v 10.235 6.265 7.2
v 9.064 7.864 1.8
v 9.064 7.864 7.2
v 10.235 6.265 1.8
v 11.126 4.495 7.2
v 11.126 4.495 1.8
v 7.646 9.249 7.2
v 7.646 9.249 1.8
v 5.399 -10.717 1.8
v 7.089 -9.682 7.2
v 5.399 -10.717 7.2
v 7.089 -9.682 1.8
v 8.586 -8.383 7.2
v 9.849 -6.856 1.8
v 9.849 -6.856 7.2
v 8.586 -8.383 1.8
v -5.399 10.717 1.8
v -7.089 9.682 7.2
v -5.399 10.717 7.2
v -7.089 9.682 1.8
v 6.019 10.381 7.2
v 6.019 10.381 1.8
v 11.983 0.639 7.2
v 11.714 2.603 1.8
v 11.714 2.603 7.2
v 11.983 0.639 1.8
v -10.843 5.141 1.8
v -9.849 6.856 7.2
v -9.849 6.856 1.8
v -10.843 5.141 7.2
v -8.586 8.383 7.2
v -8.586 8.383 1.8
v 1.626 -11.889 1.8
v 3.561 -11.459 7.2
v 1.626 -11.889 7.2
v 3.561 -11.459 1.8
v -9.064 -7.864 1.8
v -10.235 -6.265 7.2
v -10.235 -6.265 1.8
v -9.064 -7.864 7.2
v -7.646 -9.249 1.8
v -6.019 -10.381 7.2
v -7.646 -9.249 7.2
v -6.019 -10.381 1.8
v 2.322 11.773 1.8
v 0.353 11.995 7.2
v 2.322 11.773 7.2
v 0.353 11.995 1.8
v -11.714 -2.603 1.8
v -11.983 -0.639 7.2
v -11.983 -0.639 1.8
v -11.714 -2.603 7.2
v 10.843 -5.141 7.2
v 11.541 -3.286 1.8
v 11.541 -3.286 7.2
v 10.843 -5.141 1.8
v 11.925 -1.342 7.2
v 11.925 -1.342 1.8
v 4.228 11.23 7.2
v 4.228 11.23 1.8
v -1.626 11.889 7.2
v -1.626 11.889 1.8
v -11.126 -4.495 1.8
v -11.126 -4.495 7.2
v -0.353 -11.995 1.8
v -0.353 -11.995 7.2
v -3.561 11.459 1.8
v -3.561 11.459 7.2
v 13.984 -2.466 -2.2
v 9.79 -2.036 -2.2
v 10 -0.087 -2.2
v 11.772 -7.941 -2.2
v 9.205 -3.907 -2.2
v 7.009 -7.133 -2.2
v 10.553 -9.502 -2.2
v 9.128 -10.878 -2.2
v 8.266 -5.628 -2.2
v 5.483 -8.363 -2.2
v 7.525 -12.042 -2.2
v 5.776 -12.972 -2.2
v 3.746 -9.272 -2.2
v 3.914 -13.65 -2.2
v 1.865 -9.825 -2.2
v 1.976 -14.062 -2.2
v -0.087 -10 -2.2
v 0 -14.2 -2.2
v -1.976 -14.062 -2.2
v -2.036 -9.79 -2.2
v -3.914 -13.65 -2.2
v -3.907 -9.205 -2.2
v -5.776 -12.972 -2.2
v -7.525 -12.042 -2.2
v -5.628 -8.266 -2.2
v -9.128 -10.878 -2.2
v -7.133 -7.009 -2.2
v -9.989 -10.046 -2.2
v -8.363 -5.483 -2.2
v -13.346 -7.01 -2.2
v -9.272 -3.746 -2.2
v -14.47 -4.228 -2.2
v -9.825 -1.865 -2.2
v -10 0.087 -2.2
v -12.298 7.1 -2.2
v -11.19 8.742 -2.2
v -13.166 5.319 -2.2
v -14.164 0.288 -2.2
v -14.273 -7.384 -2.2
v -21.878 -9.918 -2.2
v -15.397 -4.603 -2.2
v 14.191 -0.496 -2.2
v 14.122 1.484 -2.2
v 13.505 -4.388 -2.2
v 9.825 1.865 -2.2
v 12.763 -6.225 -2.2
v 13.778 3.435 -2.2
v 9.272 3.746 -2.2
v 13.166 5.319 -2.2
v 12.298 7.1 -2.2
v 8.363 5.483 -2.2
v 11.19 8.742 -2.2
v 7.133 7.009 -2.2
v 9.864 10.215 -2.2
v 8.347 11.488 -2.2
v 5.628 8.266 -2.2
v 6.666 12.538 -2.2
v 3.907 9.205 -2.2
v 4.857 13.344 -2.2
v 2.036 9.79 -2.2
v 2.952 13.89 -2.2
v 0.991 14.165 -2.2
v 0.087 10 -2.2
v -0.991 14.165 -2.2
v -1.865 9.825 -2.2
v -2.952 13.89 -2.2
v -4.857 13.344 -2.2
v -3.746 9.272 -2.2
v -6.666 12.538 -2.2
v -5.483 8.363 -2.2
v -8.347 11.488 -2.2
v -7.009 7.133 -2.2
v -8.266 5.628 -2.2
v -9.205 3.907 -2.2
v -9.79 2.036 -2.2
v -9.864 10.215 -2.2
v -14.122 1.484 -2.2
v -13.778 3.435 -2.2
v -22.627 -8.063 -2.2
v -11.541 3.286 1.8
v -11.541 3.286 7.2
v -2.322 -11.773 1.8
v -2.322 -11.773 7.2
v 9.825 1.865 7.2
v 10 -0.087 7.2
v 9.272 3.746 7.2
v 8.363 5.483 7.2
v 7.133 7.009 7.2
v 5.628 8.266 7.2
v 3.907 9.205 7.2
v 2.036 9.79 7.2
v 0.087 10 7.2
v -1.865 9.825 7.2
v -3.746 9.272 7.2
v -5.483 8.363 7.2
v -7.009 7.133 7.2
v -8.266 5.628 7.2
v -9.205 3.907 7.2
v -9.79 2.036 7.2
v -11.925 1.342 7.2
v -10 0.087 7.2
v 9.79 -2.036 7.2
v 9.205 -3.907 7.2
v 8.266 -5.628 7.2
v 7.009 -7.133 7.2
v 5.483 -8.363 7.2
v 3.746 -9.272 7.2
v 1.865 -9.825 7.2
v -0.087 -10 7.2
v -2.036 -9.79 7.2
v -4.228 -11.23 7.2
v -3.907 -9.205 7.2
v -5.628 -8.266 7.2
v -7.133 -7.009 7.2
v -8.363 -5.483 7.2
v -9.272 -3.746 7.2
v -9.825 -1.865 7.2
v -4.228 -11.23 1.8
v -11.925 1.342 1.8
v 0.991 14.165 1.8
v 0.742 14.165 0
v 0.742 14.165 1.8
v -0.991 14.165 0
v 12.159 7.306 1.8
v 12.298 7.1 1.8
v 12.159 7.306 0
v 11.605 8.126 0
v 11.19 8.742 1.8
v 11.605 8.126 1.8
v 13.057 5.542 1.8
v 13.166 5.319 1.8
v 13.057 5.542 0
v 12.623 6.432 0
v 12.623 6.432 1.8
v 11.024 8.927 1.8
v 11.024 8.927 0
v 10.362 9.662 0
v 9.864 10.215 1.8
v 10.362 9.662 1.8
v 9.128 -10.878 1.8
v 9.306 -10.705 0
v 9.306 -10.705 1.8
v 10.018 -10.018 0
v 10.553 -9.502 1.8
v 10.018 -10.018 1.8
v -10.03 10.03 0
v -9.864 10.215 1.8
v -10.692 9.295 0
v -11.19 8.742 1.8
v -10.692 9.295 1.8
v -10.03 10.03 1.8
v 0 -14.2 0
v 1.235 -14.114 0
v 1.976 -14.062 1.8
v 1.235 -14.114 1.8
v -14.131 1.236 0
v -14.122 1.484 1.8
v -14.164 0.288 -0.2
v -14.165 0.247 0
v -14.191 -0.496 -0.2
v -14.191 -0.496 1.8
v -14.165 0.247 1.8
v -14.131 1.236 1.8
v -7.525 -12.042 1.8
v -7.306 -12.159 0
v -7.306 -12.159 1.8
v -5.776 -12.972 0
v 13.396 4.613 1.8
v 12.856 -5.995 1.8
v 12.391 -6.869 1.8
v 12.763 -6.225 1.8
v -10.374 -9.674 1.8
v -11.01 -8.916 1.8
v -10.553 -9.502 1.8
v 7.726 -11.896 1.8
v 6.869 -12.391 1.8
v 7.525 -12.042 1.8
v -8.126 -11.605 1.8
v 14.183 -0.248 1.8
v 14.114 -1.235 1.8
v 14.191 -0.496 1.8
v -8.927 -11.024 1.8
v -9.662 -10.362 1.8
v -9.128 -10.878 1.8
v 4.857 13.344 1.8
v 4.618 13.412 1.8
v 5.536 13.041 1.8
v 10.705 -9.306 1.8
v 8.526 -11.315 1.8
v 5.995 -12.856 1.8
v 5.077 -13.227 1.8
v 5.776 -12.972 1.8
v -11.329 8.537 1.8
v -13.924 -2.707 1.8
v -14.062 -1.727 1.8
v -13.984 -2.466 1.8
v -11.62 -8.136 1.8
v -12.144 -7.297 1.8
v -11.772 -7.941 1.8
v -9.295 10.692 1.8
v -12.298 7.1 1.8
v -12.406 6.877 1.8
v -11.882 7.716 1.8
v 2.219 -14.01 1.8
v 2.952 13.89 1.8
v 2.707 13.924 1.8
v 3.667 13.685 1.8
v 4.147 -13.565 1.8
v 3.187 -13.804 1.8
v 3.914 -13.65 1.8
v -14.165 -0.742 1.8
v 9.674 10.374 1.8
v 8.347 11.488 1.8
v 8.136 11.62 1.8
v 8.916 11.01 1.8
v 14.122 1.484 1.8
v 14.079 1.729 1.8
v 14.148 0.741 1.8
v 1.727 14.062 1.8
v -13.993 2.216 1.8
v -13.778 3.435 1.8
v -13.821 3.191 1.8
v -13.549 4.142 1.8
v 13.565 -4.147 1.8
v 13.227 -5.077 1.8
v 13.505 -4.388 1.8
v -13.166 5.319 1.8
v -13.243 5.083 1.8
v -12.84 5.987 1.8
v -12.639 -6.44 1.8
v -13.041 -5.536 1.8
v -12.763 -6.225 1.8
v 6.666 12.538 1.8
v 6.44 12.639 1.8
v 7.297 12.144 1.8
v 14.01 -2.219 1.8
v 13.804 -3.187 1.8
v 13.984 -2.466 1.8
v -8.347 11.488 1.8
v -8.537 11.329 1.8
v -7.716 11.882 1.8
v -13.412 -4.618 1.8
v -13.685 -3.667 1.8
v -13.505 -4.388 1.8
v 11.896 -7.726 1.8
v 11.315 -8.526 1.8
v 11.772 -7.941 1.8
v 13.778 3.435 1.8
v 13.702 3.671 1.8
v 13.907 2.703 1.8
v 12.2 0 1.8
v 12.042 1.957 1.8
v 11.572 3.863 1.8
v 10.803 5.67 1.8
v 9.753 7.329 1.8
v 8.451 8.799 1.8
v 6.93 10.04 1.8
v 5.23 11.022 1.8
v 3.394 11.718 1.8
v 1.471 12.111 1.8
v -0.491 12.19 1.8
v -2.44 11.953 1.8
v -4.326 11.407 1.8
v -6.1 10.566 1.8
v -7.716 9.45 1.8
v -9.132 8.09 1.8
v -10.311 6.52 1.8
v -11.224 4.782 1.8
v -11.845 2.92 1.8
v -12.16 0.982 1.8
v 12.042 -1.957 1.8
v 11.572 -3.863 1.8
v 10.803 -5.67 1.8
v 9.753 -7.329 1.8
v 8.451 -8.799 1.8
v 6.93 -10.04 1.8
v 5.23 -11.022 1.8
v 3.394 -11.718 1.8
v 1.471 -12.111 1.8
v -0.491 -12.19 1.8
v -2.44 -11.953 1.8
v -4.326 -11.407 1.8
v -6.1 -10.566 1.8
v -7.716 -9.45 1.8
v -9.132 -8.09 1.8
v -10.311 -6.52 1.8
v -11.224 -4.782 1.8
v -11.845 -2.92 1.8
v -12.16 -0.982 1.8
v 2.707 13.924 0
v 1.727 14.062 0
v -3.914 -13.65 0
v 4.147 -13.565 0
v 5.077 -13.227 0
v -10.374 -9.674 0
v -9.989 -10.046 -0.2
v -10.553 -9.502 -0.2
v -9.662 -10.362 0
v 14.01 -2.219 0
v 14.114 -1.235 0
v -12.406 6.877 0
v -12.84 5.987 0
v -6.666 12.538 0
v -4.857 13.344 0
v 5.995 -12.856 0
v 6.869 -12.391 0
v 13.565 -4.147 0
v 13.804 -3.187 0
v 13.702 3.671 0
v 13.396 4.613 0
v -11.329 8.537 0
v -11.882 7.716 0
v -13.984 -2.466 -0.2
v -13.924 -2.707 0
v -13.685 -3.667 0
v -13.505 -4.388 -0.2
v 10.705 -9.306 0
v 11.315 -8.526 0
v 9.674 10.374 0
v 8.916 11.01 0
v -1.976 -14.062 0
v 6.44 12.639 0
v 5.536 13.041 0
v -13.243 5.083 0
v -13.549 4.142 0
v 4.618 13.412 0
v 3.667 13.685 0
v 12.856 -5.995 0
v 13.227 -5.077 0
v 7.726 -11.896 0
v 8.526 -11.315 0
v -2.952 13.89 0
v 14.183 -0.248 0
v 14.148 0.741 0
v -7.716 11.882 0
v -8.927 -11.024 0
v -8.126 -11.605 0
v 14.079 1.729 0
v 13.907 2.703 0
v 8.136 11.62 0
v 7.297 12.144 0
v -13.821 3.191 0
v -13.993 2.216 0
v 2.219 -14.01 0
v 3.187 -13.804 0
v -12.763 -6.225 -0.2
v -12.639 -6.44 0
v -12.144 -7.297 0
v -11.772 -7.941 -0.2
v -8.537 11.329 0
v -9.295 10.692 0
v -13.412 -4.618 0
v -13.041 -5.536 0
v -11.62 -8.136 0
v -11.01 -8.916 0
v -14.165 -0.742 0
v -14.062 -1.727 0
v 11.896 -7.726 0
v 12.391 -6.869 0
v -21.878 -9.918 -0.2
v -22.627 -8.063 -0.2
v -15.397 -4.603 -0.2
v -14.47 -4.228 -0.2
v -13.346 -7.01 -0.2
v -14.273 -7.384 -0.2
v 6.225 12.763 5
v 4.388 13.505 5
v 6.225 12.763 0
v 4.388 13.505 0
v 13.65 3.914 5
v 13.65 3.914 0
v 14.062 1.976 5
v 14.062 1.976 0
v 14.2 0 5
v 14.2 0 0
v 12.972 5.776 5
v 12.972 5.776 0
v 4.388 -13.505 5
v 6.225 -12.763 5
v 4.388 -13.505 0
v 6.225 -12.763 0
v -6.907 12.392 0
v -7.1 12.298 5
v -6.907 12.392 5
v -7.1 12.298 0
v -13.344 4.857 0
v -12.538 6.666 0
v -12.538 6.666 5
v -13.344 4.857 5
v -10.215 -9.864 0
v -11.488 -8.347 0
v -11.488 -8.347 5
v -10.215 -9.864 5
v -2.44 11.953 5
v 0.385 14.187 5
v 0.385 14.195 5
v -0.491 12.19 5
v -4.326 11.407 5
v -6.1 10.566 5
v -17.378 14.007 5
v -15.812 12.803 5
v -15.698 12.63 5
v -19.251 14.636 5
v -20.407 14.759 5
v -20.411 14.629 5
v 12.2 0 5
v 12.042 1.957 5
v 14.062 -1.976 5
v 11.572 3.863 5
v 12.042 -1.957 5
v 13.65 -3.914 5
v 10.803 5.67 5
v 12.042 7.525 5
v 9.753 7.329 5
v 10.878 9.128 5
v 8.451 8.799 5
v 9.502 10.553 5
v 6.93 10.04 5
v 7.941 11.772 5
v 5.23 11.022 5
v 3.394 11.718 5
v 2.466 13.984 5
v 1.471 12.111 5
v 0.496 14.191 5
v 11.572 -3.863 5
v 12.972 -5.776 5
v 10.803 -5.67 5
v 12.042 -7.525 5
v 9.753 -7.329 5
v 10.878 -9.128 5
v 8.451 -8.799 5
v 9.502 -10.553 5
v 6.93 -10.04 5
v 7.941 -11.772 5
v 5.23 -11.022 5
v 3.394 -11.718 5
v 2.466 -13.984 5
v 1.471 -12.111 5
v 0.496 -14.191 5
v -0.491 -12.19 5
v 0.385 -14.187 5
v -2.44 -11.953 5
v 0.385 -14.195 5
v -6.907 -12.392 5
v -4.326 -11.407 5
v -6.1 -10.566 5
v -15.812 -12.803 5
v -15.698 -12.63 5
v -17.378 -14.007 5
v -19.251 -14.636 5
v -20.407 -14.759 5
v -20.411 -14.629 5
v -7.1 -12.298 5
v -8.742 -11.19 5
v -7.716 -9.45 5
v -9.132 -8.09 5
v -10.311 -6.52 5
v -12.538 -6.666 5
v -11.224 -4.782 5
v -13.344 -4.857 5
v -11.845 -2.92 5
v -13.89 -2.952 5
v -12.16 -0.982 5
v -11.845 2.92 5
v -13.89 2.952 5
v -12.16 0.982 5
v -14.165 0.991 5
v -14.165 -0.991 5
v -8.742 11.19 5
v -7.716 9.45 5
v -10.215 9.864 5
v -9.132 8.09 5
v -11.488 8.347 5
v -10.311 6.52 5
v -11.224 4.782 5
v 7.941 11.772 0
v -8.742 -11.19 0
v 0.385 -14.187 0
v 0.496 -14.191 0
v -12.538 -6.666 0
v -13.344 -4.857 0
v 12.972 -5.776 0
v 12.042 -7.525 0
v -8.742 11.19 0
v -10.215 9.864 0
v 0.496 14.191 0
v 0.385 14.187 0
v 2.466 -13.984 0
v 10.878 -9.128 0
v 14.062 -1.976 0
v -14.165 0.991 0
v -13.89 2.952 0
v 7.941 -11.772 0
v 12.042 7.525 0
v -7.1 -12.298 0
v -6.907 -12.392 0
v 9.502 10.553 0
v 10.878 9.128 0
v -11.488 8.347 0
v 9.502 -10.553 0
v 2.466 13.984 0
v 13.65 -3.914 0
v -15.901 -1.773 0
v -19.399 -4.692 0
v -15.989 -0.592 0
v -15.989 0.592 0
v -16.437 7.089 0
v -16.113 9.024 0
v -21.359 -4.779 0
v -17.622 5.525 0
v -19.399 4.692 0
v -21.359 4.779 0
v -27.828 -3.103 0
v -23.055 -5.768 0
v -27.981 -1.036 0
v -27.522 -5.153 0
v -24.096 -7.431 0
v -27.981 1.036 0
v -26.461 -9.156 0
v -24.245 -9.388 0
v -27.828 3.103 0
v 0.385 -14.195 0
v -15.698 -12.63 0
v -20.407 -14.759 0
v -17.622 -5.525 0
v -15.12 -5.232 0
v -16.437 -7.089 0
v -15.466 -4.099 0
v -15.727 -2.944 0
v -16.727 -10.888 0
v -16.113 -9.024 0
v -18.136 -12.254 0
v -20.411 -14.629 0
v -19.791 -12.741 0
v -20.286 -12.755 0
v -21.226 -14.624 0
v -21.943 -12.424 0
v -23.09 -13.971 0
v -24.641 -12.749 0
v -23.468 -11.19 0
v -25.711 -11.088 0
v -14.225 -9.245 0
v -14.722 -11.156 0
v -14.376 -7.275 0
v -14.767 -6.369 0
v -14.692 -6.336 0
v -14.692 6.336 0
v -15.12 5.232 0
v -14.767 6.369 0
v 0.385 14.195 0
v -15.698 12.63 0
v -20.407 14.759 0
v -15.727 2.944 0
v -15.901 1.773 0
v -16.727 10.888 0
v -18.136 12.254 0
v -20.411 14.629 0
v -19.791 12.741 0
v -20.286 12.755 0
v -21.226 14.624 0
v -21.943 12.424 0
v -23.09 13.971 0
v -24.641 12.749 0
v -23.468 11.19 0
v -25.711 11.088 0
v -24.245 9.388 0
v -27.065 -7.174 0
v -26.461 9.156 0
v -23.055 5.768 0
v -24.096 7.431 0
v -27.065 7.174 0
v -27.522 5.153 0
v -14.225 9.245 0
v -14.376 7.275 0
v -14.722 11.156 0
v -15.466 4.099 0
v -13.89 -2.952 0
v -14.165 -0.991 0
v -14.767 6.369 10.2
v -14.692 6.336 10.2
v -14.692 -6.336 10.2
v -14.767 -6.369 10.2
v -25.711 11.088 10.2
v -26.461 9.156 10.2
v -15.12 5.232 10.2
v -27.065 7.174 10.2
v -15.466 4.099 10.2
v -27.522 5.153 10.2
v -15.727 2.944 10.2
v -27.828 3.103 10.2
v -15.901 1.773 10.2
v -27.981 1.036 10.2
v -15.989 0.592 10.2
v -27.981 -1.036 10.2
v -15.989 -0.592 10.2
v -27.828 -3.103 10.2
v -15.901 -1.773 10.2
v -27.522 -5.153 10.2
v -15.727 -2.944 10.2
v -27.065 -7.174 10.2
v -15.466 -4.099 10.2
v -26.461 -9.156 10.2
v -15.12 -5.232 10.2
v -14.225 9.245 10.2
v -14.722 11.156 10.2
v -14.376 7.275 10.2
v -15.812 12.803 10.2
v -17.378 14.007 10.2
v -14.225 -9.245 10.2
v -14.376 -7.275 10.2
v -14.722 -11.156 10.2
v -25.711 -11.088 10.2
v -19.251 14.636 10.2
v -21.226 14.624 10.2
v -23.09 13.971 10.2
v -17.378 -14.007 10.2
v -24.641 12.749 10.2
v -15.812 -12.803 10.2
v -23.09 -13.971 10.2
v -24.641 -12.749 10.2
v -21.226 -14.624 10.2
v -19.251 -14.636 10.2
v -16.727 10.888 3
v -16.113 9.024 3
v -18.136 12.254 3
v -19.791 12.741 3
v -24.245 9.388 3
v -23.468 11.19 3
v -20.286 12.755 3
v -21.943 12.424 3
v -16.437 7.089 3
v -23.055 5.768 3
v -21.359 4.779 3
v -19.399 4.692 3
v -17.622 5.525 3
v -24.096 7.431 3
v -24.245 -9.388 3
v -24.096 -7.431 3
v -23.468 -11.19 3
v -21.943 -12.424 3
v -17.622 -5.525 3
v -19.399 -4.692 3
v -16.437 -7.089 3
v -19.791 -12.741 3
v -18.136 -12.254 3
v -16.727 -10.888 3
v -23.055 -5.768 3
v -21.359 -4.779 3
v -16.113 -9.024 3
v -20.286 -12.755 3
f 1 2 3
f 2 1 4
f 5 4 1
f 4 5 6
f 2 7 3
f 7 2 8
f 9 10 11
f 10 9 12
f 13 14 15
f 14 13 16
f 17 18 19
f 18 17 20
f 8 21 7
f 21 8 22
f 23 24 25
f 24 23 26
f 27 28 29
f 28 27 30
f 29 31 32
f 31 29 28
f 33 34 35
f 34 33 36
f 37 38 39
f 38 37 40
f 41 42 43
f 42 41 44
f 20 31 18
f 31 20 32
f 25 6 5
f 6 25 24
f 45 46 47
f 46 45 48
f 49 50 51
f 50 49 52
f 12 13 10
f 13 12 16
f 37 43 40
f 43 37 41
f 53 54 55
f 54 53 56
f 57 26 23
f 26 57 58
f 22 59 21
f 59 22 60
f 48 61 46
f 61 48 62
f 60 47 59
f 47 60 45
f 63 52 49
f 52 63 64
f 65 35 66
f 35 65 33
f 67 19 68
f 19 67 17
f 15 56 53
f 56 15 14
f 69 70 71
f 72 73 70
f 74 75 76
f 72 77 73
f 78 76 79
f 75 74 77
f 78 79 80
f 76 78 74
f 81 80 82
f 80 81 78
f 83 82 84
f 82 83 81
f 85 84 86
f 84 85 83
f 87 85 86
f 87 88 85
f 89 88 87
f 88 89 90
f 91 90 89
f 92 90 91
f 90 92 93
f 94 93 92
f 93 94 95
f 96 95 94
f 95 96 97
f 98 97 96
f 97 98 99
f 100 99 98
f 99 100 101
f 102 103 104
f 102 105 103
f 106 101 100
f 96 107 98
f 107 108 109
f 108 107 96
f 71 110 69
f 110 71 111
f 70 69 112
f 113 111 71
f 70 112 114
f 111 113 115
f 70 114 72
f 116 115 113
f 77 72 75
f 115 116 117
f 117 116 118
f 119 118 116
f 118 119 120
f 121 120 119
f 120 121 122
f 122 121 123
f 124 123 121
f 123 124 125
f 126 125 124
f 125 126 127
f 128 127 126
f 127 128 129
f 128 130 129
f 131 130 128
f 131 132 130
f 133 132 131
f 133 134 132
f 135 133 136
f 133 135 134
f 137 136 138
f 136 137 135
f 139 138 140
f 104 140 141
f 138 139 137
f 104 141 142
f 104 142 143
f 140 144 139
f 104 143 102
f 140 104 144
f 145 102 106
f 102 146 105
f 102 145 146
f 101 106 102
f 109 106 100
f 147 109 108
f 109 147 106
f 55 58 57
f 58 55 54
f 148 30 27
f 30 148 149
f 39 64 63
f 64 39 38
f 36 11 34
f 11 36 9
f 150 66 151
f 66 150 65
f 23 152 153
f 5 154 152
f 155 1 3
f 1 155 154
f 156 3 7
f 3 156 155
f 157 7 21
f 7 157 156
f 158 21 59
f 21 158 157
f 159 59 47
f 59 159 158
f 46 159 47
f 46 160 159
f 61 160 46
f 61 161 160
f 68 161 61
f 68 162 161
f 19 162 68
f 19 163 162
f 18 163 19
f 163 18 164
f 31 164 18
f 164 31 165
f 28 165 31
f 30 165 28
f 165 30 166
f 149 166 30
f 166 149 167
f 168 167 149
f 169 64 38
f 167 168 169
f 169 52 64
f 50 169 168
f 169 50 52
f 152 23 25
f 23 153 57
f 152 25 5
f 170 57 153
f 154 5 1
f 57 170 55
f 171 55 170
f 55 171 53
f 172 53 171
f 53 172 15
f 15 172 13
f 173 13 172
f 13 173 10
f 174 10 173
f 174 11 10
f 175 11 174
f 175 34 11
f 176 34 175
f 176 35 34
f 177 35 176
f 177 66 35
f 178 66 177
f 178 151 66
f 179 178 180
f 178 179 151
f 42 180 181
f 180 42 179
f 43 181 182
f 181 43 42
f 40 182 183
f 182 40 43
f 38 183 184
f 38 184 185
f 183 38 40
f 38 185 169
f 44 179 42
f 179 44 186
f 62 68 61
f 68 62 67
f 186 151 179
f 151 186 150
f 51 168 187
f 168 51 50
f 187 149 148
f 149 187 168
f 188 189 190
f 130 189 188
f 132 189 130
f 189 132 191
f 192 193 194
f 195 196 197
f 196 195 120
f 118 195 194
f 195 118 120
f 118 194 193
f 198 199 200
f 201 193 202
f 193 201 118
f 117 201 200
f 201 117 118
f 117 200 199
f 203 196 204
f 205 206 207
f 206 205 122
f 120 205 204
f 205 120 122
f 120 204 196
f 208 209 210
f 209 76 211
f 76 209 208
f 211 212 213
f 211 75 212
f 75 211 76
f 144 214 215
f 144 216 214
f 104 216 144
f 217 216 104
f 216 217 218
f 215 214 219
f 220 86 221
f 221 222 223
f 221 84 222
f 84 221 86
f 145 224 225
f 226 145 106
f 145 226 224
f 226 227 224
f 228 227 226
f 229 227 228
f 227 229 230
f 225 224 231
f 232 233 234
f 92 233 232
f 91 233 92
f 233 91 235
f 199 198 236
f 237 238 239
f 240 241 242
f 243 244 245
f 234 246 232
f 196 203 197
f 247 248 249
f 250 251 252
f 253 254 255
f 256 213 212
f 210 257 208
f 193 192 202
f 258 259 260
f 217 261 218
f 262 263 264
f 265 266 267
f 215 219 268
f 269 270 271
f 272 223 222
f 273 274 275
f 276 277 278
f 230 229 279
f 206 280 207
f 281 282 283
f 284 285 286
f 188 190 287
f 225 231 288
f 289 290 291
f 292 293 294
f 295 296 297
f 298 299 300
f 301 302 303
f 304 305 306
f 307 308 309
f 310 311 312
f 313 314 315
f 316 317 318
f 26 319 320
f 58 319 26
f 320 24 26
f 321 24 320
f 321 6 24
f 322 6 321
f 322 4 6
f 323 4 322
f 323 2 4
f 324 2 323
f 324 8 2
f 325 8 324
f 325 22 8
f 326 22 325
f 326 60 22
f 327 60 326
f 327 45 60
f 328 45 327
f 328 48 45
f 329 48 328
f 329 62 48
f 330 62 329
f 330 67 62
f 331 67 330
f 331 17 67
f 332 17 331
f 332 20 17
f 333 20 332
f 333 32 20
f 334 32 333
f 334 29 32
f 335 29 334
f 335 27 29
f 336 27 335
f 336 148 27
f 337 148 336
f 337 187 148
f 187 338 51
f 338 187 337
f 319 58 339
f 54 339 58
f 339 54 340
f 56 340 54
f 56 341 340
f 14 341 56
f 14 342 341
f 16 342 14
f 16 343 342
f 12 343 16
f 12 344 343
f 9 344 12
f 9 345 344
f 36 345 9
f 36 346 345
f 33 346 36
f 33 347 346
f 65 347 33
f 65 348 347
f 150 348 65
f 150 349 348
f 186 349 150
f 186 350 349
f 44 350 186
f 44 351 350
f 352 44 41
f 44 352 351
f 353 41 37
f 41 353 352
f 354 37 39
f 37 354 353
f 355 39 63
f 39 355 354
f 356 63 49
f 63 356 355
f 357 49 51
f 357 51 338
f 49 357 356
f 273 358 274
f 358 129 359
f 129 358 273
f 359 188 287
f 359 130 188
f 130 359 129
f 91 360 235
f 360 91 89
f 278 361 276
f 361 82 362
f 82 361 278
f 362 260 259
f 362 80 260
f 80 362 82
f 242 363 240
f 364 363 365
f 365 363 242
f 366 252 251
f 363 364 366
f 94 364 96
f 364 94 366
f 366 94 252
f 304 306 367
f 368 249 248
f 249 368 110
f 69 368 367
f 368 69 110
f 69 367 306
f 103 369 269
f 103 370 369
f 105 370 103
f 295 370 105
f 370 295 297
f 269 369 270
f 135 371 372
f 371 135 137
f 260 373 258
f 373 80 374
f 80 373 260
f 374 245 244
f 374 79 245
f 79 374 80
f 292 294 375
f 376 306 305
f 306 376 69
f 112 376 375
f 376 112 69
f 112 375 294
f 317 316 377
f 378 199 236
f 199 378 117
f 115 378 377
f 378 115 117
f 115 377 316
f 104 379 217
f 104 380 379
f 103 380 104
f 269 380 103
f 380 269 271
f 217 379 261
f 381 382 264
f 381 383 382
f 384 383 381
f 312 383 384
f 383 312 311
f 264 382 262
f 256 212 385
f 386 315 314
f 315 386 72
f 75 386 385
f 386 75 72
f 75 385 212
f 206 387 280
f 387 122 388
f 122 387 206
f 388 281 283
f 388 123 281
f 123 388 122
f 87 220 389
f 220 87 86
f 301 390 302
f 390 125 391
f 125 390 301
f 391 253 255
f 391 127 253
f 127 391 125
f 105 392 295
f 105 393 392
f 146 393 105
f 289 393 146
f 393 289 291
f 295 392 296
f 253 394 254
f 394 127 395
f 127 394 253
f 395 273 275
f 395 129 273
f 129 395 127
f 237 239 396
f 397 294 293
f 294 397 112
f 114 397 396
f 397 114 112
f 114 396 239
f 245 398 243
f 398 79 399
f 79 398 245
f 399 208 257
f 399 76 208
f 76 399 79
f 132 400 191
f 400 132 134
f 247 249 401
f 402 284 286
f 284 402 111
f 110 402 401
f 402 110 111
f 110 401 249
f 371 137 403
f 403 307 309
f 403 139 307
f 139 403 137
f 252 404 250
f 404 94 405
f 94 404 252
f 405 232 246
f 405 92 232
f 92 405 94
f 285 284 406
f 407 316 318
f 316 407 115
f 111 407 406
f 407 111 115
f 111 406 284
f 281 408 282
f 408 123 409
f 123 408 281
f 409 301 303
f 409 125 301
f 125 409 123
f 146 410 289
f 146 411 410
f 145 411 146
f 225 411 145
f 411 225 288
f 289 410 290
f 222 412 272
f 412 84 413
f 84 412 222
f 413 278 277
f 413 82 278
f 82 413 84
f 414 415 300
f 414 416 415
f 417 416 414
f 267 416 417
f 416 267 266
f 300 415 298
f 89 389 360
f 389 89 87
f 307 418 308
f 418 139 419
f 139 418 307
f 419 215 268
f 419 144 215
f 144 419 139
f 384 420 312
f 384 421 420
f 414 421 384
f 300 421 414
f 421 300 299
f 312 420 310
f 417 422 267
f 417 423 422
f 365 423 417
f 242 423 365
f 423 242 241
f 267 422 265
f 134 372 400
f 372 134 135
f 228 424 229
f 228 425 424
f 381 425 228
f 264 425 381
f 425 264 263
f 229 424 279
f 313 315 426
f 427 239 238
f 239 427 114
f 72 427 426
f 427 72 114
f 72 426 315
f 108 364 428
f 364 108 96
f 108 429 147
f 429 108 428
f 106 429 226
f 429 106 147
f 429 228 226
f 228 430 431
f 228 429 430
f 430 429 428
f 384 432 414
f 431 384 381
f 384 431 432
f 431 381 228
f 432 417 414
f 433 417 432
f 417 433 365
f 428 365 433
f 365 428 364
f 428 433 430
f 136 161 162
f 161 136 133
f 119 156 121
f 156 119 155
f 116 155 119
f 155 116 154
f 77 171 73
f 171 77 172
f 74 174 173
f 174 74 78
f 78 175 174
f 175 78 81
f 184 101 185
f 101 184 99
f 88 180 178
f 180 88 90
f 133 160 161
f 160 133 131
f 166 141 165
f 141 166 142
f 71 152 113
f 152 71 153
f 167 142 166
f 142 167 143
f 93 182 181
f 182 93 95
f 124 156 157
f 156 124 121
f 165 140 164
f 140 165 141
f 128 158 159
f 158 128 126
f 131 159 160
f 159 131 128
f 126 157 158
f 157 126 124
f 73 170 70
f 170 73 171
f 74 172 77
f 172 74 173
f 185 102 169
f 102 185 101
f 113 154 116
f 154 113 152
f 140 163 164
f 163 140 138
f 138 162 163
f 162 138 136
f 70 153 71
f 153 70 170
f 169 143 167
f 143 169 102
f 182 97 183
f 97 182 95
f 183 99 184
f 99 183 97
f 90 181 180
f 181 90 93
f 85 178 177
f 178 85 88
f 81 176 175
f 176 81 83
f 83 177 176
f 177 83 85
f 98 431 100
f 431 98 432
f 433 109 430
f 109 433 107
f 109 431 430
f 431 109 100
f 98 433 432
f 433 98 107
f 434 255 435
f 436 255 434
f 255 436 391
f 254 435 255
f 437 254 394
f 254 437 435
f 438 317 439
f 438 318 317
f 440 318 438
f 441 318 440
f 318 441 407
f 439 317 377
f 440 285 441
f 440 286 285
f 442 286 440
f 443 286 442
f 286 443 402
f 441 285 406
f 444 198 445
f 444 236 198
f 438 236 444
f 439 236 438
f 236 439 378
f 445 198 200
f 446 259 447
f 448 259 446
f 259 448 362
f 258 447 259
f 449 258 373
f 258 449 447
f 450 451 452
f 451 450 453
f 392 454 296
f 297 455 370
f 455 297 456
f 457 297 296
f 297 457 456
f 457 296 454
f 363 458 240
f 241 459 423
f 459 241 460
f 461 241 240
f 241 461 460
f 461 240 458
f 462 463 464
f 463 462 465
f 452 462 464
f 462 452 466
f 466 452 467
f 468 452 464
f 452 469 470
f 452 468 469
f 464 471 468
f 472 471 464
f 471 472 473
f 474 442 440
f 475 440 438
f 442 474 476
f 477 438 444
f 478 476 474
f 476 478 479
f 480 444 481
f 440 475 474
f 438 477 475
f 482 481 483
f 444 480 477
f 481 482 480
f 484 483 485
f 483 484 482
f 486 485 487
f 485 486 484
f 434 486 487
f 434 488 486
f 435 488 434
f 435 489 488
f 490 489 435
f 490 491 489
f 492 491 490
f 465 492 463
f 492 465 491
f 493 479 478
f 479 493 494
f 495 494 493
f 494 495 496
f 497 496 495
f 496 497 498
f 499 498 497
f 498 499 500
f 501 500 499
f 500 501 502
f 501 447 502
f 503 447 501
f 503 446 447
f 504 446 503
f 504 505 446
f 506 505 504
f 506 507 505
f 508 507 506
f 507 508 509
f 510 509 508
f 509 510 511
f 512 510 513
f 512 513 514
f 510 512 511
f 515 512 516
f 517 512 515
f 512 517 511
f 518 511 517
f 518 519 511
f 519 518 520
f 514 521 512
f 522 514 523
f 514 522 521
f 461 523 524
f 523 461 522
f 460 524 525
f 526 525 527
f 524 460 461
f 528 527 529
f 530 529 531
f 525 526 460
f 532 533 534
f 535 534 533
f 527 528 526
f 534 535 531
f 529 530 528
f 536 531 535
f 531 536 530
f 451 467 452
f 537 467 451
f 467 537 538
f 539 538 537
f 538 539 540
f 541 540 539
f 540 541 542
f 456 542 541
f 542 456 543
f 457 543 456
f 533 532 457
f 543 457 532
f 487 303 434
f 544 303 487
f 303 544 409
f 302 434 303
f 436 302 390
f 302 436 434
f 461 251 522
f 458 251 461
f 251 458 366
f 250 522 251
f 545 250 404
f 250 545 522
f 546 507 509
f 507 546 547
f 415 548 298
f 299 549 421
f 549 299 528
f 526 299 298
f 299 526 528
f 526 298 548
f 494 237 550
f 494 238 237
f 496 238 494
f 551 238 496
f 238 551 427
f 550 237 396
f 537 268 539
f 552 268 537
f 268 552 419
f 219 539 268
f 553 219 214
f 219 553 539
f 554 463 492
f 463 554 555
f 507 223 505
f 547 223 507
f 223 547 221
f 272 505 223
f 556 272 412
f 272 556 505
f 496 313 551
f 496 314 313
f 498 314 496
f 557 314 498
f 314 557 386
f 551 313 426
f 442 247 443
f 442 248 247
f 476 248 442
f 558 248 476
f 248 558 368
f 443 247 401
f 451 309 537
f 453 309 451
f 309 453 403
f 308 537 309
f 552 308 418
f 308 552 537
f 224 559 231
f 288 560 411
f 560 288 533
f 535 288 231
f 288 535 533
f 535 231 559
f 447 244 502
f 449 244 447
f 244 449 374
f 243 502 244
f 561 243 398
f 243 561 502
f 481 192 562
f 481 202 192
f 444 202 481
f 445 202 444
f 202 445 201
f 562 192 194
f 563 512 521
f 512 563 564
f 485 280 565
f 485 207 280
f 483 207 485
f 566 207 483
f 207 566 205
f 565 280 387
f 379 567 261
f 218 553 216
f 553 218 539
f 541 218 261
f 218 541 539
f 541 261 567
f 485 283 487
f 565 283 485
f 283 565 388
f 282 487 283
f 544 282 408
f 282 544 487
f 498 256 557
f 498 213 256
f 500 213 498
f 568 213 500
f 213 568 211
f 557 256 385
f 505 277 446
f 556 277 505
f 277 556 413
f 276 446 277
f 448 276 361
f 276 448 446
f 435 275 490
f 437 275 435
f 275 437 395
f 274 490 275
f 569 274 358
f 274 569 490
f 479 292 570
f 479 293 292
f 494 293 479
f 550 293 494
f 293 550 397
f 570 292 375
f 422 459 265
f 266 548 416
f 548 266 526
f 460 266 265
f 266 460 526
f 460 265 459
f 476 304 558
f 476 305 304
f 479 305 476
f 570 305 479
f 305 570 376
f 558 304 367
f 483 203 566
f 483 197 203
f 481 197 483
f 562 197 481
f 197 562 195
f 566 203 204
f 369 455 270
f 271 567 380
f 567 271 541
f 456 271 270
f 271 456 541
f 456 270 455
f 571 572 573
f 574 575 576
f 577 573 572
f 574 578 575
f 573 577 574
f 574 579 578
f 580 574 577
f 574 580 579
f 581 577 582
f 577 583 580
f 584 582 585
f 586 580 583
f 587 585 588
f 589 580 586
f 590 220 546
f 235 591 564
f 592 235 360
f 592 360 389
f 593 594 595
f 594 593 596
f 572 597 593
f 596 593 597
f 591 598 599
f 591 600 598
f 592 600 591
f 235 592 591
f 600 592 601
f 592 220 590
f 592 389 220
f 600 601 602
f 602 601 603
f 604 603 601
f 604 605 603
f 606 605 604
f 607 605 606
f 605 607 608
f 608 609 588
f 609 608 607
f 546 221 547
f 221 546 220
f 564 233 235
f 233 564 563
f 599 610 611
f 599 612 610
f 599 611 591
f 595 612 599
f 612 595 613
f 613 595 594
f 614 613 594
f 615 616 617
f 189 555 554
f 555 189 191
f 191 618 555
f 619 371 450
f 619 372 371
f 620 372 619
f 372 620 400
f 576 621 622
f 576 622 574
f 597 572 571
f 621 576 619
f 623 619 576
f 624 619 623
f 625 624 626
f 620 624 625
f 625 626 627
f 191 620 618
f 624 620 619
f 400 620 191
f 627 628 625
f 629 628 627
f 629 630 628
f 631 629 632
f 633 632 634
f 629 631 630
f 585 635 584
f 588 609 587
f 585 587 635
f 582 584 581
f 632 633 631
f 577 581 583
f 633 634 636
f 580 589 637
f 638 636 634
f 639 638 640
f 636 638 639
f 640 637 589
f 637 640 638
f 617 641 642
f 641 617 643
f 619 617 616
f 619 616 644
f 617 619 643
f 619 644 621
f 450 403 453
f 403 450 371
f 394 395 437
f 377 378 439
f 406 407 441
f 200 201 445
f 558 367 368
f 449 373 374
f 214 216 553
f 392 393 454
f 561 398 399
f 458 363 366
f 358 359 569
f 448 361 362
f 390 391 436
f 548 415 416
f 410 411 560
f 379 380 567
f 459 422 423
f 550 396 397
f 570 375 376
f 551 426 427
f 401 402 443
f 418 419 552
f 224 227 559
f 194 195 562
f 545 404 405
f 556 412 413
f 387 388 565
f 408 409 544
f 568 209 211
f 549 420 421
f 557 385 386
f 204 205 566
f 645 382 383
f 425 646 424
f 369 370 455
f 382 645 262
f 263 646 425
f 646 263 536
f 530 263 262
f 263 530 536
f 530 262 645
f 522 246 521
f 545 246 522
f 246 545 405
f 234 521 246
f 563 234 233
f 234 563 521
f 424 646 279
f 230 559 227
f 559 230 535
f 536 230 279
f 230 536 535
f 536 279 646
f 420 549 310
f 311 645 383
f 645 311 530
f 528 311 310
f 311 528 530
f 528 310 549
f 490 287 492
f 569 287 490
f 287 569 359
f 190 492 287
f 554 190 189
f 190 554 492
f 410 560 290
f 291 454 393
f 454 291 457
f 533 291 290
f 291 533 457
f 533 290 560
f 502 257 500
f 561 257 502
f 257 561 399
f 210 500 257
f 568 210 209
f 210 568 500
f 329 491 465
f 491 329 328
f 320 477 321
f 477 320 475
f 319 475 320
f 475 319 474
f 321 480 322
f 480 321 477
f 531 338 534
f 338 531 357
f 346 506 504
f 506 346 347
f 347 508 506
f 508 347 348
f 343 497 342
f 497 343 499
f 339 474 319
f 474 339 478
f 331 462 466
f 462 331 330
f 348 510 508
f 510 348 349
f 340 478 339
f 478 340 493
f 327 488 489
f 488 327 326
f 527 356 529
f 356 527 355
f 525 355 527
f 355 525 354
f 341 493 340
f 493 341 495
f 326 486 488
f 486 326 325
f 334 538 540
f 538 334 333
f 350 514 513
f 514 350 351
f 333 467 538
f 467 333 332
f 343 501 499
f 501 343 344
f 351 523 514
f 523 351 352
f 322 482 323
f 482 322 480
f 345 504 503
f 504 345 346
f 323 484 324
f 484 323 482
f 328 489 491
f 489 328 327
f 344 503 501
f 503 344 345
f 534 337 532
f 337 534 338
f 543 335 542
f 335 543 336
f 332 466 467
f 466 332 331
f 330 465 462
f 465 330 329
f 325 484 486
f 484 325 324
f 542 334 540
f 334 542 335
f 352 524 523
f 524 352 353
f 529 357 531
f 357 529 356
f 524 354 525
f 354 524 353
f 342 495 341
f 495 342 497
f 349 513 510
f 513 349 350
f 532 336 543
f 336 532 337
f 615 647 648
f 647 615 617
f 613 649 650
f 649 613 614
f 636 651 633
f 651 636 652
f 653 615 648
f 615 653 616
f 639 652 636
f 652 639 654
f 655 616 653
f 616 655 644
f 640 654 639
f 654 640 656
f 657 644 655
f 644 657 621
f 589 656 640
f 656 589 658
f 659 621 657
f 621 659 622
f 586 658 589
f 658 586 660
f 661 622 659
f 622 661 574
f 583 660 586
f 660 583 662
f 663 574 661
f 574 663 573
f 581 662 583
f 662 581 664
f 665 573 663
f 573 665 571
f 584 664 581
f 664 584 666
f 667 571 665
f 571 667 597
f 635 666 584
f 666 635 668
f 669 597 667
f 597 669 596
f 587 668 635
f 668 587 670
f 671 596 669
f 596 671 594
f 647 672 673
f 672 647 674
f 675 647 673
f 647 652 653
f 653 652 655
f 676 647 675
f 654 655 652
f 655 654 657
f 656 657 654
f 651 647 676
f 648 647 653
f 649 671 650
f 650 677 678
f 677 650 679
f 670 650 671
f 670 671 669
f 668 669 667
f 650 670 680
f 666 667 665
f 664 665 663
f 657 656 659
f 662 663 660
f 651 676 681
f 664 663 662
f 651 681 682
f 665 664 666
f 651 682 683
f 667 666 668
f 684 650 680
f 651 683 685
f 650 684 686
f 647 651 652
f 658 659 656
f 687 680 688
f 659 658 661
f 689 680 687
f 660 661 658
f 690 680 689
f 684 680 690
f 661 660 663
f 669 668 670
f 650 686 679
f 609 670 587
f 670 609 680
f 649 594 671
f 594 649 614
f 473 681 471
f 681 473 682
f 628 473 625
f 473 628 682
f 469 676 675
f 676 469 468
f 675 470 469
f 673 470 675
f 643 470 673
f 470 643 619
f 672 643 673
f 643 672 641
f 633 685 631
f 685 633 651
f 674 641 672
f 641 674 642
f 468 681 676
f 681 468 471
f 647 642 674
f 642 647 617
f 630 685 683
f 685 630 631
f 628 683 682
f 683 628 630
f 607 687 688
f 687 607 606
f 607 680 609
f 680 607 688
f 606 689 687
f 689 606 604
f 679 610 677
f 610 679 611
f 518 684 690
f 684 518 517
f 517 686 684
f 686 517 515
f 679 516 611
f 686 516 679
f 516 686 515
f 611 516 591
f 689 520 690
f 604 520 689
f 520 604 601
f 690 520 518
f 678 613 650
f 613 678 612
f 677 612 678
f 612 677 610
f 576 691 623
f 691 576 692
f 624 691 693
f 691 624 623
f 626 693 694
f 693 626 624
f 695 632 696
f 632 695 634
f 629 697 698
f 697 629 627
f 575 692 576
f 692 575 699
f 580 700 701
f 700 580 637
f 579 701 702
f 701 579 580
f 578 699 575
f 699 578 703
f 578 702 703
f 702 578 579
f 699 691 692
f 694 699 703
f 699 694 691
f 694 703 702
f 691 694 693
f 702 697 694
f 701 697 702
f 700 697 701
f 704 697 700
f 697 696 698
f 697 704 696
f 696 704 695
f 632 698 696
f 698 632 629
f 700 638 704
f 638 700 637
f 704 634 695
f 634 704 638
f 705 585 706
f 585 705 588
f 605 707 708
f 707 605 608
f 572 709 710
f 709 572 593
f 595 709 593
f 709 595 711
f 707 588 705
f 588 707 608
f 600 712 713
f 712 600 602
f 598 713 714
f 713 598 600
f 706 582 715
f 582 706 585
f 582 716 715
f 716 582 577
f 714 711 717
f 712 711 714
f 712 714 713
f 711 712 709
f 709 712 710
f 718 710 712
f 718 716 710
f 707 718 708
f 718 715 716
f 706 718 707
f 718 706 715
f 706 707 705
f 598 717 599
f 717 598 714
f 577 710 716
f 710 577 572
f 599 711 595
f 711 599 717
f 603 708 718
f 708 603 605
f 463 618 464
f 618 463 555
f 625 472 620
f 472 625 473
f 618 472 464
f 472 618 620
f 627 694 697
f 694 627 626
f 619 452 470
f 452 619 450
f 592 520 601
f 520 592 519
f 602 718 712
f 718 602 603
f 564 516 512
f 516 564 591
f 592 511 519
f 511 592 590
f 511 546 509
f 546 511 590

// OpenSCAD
// Wall Thickness
wall = 2; // [1:0.5:5]
// Steel Thickness
steel = 3; // [2:0.5:4]
// Rivet Diameter
rivet = 20; // [15:0.5:25]
// Pivot Radius
radius = 16; // [10:0.5:20]
// Part Height
height = 5; // [1:1:20]
tolerance = 0.2; // [0.05:0.05:0.5]
// Magnet Thickness
mag_thick = 3; // [1:0.5:5]
// Magnet Diameter
magnet = 8; // [1:1:20]
// Distance Between Magnets
distance = 16; // [10:1:20]

// Resolution
$fs = 2; // [1:High, 2:Medium, 4:Low]
$fa = 0.01 + 0;

translate([0, 0, -wall-tolerance])
//translate([rivet*2, 0, 0])
rotate(22, [0,0,1])
	stationary_pivot();
/*
*/

translate([0, 0, 0])
	rotating_pivot();
/*

magnet_holder_new(3);
*/

module stationary_pivot() {
	difference() {
		union() {
			cylinder(d=rivet+wall*2, h=height+wall*2+tolerance*2); // OD
			cylinder(d=rivet+wall*4+tolerance*2, h=wall*2);        // Flange
			/*
			translate([0, 0, height+wall+tolerance*2])
				cylinder(d=rivet+wall*4+tolerance*2, h=wall);    // Upper Flange
			*/
			linear_extrude(wall)                                   // Sensor tab
				polygon([
					[-radius-magnet, 1], // Q2
					[-radius-magnet, -1], // Q3
					[-rivet/2-wall, -wall*3], // Q4
					[-rivet/2-wall, wall*3] // Q1
				]);
		}
		translate([0, 0, -1])
			cylinder(d=rivet, h=height+wall*2+tolerance+2);      // ID
		translate([-radius, -1.5, -1])
			cube([1, 3, wall+2]);                                // Wire Cutout
	}
}

module rotating_pivot() {
	od = rivet+wall*4+tolerance*2;

	difference() {
		cylinder(d=od, h=height);               // OD
		translate([0, 0, -1])
			cylinder(d=od-wall*2, h=height+2);  // ID
	}

	r = radius + magnet*0.6;
	a = (distance+magnet) / od * 50 - 40.7;

	rotate(-a, [0,0,1])
		translate([-r, rivet/2+wall+tolerance, 0])
			cube([r, wall, height]);                   // Upper arm
	rotate(a, [0,0,1])
		translate([-r, -rivet/2-wall*2-tolerance, 0])
			cube([r, wall, height]);                          // Lower arm

	magnet_holder();
}

module magnet_holder() {
	H = height + steel + wall + tolerance;
	R = radius;         // Inner radius of arc
	D = magnet+wall*2;  // Distance between IR and OR
	r = R+D/2;          // Radius to center of arc
	a = asin(distance/r) / 2;  // Angle between magnets
	A = sin($t*360) * a;// Animation angle offset
	difference() {
		rotate(180-a + A, [0,0,1])
			union() {
				rotate_extrude(angle=a*2)
					translate([R, 0, 0]) {
						square([D, H]);
					}
				translate([r, 0, 0])
					cylinder(d=D, h=H);
				rotate(a*2, [0,0,1])
					translate([r, 0, 0])
						cylinder(d=D, h=H);
			}

		rotate(-a + A, [0,0,1])
			translate([-r, 0, -1])
				cylinder(d=magnet+tolerance, h=mag_thick+1);   // Upper magent

		rotate(a + A, [0,0,1])
			translate([-r, 0, -1])
				cylinder(d=magnet+tolerance, h=mag_thick+1);   // Lower magent
	}
}
